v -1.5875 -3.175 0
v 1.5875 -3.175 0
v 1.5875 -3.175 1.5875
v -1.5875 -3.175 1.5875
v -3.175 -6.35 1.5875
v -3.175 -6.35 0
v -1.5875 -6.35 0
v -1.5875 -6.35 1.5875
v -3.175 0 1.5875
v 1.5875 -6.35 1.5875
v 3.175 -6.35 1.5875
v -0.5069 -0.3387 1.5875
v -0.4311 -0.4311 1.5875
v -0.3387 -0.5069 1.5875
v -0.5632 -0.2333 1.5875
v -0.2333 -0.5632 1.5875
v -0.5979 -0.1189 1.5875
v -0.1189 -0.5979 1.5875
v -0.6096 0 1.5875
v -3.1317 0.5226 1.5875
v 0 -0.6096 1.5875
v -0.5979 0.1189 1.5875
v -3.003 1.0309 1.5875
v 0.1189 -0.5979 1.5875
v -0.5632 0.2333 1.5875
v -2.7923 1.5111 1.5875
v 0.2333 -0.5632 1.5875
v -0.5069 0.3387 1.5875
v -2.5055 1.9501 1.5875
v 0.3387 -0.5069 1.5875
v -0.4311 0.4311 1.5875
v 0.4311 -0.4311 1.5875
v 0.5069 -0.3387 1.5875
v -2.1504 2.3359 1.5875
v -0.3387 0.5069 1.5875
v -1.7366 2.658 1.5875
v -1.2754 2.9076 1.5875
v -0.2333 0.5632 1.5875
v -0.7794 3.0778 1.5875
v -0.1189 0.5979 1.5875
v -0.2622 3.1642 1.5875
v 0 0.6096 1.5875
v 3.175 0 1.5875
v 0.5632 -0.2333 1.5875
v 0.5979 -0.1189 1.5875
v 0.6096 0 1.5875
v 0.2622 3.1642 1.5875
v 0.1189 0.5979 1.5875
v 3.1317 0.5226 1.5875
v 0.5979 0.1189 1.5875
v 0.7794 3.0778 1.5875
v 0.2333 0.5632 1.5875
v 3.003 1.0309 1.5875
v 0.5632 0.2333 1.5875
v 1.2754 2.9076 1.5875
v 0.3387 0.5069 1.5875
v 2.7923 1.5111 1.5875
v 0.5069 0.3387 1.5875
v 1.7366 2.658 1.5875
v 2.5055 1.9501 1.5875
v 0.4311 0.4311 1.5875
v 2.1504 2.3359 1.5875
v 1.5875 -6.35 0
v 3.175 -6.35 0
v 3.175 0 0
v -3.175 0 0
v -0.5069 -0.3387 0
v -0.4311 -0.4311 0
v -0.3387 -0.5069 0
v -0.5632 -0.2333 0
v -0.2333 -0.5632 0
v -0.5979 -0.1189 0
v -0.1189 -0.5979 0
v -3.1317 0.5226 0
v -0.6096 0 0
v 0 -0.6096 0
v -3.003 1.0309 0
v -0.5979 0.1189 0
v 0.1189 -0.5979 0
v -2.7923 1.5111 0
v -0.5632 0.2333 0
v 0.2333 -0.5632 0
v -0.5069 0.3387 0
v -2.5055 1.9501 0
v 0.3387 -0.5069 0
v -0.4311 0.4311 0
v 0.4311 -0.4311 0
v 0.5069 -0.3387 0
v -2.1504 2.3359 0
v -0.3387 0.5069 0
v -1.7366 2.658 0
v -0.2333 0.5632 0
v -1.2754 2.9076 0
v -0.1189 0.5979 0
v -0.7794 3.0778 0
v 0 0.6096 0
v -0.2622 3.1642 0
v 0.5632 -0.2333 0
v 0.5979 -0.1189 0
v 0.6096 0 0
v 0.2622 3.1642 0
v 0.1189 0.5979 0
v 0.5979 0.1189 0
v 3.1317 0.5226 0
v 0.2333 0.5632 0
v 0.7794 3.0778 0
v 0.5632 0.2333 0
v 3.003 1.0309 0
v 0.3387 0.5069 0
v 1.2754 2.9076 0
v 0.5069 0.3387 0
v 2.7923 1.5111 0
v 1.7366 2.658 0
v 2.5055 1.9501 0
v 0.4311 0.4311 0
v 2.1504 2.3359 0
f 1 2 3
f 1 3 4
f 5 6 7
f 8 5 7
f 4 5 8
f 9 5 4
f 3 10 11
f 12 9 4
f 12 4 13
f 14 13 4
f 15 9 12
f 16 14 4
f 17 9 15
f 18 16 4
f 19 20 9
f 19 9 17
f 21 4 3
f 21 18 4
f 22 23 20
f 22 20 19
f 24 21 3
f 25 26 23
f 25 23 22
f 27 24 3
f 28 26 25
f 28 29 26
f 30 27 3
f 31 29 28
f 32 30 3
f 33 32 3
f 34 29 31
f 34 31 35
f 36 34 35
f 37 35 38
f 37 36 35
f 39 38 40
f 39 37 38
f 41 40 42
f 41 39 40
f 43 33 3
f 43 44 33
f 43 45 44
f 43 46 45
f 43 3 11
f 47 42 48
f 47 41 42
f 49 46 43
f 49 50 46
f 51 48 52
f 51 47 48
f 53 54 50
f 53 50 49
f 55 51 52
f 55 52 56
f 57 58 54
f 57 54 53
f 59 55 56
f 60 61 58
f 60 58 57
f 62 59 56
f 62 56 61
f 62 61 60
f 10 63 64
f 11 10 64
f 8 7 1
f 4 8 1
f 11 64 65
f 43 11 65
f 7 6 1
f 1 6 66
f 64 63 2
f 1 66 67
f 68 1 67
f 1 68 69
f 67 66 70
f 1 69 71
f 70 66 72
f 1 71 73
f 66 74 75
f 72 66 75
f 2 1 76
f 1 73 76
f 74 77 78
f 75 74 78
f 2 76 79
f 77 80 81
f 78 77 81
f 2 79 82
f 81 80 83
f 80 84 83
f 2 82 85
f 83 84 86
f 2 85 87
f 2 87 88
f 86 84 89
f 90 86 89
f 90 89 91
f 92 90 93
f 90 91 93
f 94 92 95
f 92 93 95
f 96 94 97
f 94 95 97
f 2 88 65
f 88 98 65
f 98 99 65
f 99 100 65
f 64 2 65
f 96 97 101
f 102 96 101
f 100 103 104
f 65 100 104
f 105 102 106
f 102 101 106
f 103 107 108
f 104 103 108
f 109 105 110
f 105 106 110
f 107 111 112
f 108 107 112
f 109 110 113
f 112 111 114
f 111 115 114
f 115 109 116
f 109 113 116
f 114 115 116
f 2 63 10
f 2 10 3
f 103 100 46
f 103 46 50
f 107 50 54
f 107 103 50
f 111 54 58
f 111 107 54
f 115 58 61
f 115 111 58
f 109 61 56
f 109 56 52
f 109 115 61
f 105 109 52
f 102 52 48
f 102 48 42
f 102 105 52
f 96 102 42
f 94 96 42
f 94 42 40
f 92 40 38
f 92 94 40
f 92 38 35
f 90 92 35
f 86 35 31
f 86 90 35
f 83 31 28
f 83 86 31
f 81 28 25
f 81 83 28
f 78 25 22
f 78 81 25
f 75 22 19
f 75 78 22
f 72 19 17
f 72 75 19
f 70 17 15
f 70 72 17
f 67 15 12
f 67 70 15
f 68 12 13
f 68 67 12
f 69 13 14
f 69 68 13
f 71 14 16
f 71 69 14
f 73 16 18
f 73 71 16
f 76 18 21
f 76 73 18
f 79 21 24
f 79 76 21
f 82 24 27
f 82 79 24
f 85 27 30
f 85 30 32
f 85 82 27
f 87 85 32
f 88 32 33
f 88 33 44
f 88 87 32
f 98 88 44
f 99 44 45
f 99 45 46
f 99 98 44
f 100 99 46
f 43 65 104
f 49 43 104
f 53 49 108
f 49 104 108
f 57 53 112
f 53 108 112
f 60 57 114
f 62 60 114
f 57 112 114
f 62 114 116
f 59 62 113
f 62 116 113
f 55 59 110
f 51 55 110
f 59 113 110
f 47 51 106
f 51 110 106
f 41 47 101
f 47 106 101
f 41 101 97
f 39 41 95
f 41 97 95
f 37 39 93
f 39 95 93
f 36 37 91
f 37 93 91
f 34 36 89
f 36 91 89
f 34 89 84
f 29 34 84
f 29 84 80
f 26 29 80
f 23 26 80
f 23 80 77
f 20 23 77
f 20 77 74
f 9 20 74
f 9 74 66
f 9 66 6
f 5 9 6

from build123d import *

# Parameters (mm, degrees)
SKETCH1_R           = 0.6096
BOSS_EXTRUDE1_DEPTH = 1.5875
SKETCH2_W           = 3.175
SKETCH2_H           = 3.175
CUT_EXTRUDE1_DEPTH  = 8.274838916


with BuildPart() as part:
    # Sketch1 → Boss-Extrude1 (new body)
    with BuildSketch(Plane.XY):
        with BuildLine():
            Line((-3.175, 0), (-3.175, -6.35))
            Line((-3.175, -6.35), (3.175, -6.35))
            Line((3.175, -6.35), (3.175, 0))
            ThreePointArc((3.175, 0), (0, 3.175), (-3.175, 0))
        make_face()
        Circle(SKETCH1_R, mode=Mode.SUBTRACT)
    extrude(amount=BOSS_EXTRUDE1_DEPTH)

    # Sketch2 → Cut-Extrude1 (cut, through all)
    with BuildSketch(Plane(origin=(0, 0, 0), x_dir=(-1, 0, 0), z_dir=(0, 0, -1))):
        with Locations((0, -4.7625)):
            Rectangle(SKETCH2_W, SKETCH2_H)
    extrude(amount=-CUT_EXTRUDE1_DEPTH, mode=Mode.SUBTRACT)


solid = part.part
